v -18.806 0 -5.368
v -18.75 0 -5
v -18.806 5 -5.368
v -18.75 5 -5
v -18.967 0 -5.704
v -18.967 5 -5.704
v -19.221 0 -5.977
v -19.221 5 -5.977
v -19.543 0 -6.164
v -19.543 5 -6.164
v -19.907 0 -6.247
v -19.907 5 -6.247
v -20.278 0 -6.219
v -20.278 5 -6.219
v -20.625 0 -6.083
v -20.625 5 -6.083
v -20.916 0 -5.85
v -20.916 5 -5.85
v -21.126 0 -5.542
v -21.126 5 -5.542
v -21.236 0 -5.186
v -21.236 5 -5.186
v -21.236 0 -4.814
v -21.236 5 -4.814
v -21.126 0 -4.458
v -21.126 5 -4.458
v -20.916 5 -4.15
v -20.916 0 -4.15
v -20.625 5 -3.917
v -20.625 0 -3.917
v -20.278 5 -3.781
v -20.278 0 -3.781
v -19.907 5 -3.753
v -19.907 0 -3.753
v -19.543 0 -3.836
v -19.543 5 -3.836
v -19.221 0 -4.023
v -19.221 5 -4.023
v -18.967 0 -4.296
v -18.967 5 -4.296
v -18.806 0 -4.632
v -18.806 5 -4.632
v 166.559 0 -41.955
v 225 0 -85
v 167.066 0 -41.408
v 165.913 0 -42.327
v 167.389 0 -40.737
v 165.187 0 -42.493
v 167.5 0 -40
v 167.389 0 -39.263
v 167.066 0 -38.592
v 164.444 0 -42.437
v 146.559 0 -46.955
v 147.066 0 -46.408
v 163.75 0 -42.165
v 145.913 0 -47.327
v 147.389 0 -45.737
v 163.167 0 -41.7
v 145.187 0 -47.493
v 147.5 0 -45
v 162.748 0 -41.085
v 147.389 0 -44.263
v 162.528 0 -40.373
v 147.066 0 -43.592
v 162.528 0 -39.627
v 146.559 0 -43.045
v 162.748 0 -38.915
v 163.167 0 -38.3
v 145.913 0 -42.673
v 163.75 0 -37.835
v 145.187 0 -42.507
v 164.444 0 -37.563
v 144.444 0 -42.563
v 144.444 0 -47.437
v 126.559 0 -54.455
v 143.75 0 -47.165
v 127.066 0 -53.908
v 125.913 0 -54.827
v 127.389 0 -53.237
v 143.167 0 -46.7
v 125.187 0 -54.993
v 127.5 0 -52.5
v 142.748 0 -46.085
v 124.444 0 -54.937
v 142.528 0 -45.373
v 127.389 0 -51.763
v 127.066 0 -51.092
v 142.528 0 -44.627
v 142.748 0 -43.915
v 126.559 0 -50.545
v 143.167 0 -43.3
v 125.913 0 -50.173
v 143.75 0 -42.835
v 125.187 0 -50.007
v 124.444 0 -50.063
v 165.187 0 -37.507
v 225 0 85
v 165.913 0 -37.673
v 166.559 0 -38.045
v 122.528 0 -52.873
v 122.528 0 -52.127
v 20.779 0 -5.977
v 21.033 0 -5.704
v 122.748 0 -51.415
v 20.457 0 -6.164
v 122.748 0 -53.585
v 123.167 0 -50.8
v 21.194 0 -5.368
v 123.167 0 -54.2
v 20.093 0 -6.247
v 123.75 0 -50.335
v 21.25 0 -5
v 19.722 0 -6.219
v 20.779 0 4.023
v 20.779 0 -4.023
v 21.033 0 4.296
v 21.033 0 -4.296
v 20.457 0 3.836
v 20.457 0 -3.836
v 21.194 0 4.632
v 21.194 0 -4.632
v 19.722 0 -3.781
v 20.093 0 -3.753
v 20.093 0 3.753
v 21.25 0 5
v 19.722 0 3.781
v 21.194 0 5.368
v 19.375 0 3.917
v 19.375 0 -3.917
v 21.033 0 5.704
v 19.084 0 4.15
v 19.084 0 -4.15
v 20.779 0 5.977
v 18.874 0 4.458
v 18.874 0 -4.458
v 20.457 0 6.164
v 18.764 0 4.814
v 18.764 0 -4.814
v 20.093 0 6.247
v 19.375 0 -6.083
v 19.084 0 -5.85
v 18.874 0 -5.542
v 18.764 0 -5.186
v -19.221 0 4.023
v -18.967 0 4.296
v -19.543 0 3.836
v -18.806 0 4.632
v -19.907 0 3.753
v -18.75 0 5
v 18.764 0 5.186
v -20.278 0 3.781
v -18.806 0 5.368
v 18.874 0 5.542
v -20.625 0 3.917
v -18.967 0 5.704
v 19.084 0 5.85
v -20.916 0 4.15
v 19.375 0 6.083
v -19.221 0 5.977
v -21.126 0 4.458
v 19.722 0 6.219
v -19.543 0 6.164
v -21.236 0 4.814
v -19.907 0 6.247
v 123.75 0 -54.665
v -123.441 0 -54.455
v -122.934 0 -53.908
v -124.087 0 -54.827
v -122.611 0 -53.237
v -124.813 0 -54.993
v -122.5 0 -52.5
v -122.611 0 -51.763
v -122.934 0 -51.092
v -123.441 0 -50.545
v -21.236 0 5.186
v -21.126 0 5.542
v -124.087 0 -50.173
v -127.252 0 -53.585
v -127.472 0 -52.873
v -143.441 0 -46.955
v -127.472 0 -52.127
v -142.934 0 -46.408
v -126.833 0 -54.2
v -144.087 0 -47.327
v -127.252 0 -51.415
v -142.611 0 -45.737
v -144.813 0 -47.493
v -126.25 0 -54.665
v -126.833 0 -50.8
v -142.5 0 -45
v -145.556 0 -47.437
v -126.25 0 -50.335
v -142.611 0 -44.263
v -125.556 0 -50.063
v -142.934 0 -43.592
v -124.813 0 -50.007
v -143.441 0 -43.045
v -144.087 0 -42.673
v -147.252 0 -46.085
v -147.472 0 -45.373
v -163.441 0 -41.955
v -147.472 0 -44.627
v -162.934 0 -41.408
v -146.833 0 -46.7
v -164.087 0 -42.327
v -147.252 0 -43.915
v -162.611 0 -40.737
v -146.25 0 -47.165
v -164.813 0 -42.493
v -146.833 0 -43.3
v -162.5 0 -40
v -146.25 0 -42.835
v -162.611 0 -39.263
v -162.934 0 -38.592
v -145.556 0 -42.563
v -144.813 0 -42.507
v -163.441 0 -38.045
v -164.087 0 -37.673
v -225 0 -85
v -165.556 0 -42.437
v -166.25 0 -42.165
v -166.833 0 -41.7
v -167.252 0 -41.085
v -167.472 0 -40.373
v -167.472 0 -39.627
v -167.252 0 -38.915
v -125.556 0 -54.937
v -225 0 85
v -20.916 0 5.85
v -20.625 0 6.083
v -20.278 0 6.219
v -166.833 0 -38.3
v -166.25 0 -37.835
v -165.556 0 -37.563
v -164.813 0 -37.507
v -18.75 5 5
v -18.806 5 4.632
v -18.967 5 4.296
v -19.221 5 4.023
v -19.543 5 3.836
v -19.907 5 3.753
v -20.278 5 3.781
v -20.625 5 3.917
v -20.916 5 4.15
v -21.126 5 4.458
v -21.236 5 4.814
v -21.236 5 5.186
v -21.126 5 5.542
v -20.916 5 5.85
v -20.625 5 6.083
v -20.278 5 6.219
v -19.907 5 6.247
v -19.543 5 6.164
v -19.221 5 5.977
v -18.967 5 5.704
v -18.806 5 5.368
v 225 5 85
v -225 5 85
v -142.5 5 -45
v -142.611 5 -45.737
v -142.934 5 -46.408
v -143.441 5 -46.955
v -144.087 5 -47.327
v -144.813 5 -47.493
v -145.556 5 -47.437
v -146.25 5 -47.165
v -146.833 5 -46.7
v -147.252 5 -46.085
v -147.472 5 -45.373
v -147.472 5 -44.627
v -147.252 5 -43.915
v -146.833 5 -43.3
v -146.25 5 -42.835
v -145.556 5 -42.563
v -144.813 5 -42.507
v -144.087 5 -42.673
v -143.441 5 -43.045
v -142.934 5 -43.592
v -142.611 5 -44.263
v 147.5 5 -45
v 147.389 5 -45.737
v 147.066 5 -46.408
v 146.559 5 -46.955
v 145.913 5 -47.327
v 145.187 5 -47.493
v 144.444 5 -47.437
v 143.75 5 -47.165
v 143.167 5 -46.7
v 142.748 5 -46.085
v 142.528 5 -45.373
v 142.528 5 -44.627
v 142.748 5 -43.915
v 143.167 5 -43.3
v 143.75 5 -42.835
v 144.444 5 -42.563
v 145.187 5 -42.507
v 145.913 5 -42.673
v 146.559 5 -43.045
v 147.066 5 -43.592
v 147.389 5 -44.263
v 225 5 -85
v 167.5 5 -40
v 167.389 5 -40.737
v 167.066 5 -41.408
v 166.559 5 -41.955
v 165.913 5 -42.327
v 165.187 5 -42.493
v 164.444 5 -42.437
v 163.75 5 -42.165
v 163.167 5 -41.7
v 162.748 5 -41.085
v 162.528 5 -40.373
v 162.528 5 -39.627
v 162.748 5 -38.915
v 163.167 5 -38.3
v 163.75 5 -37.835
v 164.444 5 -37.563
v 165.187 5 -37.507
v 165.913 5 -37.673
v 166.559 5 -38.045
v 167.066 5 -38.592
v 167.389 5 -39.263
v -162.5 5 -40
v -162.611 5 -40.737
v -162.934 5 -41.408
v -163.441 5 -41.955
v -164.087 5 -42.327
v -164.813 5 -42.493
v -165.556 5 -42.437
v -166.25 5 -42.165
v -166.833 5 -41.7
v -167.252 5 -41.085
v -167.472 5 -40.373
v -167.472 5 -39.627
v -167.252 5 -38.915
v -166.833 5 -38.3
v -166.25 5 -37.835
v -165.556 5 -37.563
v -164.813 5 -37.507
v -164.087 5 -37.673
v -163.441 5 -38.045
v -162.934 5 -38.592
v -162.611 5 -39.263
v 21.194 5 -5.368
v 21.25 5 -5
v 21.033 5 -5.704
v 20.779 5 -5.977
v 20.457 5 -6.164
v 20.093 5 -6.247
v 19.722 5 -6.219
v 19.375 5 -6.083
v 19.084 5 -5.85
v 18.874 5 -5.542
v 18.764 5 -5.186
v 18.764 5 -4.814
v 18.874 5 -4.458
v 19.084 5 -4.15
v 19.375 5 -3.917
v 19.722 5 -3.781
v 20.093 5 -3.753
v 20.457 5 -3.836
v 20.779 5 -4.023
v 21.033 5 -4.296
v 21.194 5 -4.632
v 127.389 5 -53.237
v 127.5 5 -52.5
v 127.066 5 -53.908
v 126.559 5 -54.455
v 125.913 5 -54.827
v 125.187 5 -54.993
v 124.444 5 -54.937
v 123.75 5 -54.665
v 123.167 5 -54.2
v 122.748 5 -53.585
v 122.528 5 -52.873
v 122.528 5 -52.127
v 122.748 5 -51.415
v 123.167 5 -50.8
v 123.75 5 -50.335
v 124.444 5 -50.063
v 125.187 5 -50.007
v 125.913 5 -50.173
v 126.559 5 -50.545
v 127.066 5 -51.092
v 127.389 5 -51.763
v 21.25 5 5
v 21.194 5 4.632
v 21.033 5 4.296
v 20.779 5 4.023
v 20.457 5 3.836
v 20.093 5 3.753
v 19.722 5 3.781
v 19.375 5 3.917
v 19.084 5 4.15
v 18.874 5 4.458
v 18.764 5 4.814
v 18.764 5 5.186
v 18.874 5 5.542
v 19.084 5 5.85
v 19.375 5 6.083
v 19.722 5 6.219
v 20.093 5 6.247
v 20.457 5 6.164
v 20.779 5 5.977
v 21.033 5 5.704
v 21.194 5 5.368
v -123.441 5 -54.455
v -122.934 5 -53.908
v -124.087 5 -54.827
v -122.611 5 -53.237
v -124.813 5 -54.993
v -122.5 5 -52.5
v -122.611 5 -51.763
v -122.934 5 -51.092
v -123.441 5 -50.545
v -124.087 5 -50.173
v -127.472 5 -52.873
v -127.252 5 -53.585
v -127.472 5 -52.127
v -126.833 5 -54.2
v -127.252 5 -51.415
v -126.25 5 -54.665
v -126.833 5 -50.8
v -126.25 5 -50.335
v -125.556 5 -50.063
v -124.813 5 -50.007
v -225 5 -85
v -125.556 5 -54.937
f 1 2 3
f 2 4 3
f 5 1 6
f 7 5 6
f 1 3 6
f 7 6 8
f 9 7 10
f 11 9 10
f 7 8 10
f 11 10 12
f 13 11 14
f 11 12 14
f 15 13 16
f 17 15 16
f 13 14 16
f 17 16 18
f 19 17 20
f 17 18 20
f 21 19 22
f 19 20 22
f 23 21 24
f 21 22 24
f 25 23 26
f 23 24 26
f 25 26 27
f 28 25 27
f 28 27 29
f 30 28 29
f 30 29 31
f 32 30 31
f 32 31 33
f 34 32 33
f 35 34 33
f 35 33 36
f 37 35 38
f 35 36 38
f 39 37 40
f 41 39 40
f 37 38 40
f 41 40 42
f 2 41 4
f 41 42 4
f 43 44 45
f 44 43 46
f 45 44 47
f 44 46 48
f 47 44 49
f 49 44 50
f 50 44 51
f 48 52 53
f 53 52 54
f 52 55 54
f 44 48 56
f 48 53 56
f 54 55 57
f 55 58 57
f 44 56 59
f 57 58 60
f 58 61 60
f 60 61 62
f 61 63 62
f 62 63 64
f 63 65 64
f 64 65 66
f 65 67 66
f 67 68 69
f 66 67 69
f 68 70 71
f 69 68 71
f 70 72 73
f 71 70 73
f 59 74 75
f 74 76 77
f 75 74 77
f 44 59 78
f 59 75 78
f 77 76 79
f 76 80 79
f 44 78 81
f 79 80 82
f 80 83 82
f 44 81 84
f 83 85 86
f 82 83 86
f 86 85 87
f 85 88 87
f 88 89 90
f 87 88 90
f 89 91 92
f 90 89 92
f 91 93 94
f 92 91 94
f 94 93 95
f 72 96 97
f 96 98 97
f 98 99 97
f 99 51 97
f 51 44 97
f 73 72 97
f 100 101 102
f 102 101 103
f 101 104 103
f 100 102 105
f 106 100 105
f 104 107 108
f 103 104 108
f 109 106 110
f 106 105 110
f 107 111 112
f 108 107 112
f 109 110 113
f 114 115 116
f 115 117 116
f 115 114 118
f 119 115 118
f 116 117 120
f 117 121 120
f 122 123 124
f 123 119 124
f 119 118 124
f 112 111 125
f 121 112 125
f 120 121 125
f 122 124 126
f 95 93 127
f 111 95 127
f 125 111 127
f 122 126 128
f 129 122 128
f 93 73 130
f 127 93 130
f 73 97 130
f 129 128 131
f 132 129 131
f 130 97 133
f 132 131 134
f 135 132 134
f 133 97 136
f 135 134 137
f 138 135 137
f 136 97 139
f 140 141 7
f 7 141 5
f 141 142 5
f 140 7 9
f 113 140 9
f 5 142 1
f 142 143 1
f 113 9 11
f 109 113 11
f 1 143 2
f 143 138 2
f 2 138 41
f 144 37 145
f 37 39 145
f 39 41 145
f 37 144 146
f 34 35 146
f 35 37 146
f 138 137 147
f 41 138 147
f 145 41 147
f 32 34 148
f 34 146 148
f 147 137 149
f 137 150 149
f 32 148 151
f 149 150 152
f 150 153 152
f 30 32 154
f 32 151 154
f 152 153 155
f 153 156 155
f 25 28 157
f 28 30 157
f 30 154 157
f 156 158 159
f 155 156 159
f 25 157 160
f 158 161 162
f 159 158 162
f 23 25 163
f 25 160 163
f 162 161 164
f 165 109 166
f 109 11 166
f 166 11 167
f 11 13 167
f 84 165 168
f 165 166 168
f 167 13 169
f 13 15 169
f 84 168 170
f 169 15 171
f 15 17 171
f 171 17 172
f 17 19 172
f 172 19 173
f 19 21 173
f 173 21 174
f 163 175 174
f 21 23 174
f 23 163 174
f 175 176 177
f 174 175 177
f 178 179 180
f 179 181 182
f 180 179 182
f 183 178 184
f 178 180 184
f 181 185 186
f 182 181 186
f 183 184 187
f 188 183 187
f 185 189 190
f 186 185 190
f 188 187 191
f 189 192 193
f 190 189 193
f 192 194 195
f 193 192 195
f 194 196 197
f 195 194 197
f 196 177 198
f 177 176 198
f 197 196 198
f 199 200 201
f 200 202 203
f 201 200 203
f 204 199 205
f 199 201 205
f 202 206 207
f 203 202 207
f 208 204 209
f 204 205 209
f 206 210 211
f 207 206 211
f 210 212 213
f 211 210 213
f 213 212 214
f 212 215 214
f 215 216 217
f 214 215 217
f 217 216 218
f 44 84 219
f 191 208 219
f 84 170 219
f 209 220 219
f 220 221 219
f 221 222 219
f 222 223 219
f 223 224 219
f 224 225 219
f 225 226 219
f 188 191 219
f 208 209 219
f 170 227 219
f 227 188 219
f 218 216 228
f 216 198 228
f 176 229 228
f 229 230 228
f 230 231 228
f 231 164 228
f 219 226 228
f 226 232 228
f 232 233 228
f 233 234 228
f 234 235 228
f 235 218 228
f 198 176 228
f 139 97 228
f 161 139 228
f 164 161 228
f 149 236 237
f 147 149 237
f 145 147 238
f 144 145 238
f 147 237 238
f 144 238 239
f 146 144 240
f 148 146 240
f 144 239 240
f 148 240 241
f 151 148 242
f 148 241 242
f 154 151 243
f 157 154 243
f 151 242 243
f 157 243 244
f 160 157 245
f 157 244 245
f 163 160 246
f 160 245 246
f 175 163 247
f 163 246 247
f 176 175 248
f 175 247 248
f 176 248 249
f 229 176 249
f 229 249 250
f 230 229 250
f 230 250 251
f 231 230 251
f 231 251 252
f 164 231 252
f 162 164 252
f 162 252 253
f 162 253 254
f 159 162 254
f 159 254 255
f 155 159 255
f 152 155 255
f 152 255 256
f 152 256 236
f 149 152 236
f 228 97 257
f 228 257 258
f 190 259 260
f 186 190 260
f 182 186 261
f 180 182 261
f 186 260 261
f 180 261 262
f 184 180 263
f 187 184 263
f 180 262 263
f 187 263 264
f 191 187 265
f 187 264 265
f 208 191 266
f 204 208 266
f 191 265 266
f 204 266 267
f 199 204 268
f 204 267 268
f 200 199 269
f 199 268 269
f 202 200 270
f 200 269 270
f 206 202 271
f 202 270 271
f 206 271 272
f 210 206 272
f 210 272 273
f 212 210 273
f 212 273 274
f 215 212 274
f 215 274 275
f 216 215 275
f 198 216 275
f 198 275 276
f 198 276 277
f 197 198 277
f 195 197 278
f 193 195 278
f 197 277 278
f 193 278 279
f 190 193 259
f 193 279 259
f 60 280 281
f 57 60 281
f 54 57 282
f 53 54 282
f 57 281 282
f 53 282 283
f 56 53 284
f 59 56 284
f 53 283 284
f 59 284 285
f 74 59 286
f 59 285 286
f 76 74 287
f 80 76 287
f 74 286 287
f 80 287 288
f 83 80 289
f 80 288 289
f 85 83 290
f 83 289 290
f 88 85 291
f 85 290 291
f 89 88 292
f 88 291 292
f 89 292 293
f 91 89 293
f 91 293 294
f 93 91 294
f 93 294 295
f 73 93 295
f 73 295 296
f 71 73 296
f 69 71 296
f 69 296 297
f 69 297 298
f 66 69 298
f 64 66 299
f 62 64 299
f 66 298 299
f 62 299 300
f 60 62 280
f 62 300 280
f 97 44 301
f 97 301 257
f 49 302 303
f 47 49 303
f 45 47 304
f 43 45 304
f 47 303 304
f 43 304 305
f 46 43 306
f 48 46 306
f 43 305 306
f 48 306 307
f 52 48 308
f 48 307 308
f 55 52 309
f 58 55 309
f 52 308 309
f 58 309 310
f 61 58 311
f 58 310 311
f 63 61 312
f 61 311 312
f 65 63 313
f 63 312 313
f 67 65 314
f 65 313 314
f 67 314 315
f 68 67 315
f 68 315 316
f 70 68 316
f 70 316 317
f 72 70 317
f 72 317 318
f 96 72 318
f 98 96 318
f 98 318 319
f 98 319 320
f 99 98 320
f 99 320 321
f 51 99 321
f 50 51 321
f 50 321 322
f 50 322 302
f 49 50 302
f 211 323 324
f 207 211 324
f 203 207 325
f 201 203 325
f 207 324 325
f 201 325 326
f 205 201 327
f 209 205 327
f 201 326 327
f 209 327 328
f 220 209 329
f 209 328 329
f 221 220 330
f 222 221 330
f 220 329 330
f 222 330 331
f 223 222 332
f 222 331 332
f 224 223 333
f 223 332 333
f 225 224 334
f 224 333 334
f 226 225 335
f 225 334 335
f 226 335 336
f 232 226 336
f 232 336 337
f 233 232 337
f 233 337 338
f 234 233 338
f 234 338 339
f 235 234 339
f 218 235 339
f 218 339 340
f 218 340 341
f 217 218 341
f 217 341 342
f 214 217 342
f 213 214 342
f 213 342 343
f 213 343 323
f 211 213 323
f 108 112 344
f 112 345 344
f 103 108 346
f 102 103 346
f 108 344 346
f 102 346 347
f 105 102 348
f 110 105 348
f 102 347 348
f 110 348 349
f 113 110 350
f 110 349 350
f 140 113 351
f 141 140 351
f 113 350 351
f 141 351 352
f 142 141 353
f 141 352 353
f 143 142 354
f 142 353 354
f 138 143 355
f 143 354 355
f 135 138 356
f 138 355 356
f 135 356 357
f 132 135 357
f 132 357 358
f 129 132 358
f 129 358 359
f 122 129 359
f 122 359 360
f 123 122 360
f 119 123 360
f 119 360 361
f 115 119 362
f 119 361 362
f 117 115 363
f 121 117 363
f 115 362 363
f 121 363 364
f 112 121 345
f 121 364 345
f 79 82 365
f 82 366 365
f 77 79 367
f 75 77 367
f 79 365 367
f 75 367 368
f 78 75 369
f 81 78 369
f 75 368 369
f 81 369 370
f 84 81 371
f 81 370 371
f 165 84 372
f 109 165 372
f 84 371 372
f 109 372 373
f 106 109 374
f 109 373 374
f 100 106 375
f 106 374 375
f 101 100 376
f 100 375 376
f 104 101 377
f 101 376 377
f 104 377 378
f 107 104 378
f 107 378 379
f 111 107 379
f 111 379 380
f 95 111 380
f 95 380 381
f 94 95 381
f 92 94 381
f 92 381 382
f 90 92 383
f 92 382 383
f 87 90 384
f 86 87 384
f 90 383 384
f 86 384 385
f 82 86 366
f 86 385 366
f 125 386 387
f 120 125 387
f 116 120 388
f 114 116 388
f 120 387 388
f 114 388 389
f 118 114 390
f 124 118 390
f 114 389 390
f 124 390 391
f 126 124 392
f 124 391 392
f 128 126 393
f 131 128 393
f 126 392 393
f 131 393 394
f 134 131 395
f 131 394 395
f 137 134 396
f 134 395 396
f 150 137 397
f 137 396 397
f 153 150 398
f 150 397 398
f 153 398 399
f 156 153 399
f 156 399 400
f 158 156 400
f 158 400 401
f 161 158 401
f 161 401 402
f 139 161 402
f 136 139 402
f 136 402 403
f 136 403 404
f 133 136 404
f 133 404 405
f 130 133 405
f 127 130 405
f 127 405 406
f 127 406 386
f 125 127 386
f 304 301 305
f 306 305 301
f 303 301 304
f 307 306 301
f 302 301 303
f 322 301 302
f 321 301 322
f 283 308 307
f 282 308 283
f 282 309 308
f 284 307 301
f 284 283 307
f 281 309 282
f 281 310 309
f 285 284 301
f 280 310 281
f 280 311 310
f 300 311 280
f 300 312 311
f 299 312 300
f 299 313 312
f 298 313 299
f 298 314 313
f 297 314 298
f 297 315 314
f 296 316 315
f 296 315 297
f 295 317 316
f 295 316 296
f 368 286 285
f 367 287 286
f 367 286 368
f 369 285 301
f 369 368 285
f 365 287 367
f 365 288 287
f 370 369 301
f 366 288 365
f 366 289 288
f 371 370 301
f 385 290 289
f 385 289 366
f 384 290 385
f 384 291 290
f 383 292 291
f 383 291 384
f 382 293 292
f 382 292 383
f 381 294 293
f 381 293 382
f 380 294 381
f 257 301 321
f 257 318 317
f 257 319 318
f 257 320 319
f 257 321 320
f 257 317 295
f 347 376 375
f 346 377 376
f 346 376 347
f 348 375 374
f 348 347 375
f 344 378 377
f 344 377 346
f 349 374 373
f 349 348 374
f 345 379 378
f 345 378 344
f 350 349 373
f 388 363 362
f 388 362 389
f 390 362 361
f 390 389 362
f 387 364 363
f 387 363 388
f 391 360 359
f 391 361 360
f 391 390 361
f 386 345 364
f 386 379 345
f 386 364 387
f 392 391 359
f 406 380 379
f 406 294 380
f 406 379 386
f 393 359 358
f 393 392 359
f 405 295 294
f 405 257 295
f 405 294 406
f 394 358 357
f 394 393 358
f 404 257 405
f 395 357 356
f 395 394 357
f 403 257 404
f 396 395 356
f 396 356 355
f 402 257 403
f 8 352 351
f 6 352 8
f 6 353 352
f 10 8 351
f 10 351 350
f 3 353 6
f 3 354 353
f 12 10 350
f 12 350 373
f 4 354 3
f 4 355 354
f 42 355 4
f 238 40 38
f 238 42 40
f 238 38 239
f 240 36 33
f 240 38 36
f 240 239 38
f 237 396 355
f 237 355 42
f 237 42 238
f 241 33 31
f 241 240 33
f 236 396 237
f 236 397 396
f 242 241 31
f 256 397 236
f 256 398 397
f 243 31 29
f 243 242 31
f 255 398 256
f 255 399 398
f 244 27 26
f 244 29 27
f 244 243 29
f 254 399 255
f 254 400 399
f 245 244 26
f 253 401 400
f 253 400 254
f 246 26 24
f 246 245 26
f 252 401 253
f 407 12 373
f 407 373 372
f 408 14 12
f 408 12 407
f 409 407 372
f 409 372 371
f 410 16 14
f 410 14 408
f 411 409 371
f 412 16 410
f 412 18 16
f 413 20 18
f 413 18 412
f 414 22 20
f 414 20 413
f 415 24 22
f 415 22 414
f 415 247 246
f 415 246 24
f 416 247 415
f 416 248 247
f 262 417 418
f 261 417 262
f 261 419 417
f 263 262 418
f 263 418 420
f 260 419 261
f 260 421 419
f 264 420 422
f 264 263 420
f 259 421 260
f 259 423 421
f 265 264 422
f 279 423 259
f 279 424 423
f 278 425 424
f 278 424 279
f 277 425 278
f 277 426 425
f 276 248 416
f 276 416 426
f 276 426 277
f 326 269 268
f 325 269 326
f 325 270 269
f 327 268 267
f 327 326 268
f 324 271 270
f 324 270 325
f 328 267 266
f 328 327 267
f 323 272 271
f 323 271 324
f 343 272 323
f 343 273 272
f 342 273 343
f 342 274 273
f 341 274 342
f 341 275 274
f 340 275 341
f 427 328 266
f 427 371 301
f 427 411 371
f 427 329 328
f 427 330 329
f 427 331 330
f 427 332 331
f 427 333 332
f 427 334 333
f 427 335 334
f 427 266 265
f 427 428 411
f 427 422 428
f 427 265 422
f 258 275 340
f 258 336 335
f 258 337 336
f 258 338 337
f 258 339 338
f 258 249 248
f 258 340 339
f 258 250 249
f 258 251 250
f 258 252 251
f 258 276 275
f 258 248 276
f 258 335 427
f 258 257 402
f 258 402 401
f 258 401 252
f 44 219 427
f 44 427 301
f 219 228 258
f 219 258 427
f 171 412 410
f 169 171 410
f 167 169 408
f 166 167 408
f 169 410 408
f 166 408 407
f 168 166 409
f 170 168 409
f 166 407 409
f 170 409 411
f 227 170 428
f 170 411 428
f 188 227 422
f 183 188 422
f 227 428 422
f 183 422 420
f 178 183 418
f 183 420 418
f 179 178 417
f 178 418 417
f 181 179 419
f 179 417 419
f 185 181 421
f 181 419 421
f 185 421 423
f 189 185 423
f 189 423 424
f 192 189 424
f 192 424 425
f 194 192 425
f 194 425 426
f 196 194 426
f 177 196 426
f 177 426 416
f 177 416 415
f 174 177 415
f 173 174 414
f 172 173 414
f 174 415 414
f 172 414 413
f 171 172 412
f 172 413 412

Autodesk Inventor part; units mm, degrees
ref_plane "YZ Plane" through (0, 0, 0) normal (1, 0, 0) x (0, 1, 0)
ref_plane "XZ Plane" through (0, 0, 0) normal (0, 1, 0) x (-1, 0, 0)
ref_plane "XY Plane" through (0, 0, 0) normal (0, 0, 1) x (1, 0, 0)
sketch "Sketch1" plane through (0, 0, 0) normal (0, 1, 0) x (-1, 0, 0)
  line L0 (-225, 85) -> (225, 85)
  line L1 (225, 85) -> (225, -85)
  line L2 (225, -85) -> (-225, -85)
  line L3 (-225, -85) -> (-225, 85)
  point P0 (0, 0)
  dimension "d0" = 450
  dimension "d2" = 170
  dimension "d3" = 225
  dimension "d4" = 85
extrude "Extrusion1" add sketch "Sketch1" along normal blind 5
sketch "Sketch2" plane through (0, 5, 0) normal (0, 1, 0) x (1, 0, 0)
  line L0 (-225, -85) -> (225, -85) projected
  line L1 (225, -85) -> (225, 85) projected
  line L2 (-225, 85) -> (-225, -85) projected
  circle A0 centre (-165, 40) radius 2.5
  circle A1 centre (-145, 45) radius 2.5
  circle A2 centre (-125, 52.5) radius 2.5
  circle A3 centre (125, 52.5) radius 2.5
  circle A4 centre (145, 45) radius 2.5
  circle A5 centre (165, 40) radius 2.5
  circle A6 centre (-20, -5) radius 1.25
  circle A7 centre (-20, 5) radius 1.25
  circle A8 centre (20, -5) radius 1.25
  circle A9 centre (20, 5) radius 1.25
  point P0 (0, 0)
  dimension "d7" = 137.5
  dimension "d8" = 130
  dimension "d9" = 125
  dimension "d10" = 60
  dimension "d11" = 80
  dimension "d12" = 100
  dimension "d13" = 100
  dimension "d14" = 80
  dimension "d15" = 60
  dimension "d16" = 125
  dimension "d17" = 130
  dimension "d18" = 137.5
  dimension "d19" = 20
  dimension "d20" = 20
  dimension "d21" = 20
  dimension "d22" = 20
  dimension "d23" = 80
  dimension "d24" = 80
  dimension "d26" = 10
  dimension "d27" = 10
  dimension "d28" = 5
  dimension "d29" = 5
  dimension "d30" = 5
  dimension "d31" = 5
  dimension "d32" = 5
  dimension "d33" = 5
  dimension "d34" = 2.5
  dimension "d35" = 2.5
  dimension "d36" = 2.5
  dimension "d37" = 2.5
extrude "Extrusion2" cut sketch "Sketch2" against normal through all
equation "\"d3\" = 0.5 * d0"
equation "\"d4\" = 0.5 * d2"
properties part number "Camera Rig Base"
